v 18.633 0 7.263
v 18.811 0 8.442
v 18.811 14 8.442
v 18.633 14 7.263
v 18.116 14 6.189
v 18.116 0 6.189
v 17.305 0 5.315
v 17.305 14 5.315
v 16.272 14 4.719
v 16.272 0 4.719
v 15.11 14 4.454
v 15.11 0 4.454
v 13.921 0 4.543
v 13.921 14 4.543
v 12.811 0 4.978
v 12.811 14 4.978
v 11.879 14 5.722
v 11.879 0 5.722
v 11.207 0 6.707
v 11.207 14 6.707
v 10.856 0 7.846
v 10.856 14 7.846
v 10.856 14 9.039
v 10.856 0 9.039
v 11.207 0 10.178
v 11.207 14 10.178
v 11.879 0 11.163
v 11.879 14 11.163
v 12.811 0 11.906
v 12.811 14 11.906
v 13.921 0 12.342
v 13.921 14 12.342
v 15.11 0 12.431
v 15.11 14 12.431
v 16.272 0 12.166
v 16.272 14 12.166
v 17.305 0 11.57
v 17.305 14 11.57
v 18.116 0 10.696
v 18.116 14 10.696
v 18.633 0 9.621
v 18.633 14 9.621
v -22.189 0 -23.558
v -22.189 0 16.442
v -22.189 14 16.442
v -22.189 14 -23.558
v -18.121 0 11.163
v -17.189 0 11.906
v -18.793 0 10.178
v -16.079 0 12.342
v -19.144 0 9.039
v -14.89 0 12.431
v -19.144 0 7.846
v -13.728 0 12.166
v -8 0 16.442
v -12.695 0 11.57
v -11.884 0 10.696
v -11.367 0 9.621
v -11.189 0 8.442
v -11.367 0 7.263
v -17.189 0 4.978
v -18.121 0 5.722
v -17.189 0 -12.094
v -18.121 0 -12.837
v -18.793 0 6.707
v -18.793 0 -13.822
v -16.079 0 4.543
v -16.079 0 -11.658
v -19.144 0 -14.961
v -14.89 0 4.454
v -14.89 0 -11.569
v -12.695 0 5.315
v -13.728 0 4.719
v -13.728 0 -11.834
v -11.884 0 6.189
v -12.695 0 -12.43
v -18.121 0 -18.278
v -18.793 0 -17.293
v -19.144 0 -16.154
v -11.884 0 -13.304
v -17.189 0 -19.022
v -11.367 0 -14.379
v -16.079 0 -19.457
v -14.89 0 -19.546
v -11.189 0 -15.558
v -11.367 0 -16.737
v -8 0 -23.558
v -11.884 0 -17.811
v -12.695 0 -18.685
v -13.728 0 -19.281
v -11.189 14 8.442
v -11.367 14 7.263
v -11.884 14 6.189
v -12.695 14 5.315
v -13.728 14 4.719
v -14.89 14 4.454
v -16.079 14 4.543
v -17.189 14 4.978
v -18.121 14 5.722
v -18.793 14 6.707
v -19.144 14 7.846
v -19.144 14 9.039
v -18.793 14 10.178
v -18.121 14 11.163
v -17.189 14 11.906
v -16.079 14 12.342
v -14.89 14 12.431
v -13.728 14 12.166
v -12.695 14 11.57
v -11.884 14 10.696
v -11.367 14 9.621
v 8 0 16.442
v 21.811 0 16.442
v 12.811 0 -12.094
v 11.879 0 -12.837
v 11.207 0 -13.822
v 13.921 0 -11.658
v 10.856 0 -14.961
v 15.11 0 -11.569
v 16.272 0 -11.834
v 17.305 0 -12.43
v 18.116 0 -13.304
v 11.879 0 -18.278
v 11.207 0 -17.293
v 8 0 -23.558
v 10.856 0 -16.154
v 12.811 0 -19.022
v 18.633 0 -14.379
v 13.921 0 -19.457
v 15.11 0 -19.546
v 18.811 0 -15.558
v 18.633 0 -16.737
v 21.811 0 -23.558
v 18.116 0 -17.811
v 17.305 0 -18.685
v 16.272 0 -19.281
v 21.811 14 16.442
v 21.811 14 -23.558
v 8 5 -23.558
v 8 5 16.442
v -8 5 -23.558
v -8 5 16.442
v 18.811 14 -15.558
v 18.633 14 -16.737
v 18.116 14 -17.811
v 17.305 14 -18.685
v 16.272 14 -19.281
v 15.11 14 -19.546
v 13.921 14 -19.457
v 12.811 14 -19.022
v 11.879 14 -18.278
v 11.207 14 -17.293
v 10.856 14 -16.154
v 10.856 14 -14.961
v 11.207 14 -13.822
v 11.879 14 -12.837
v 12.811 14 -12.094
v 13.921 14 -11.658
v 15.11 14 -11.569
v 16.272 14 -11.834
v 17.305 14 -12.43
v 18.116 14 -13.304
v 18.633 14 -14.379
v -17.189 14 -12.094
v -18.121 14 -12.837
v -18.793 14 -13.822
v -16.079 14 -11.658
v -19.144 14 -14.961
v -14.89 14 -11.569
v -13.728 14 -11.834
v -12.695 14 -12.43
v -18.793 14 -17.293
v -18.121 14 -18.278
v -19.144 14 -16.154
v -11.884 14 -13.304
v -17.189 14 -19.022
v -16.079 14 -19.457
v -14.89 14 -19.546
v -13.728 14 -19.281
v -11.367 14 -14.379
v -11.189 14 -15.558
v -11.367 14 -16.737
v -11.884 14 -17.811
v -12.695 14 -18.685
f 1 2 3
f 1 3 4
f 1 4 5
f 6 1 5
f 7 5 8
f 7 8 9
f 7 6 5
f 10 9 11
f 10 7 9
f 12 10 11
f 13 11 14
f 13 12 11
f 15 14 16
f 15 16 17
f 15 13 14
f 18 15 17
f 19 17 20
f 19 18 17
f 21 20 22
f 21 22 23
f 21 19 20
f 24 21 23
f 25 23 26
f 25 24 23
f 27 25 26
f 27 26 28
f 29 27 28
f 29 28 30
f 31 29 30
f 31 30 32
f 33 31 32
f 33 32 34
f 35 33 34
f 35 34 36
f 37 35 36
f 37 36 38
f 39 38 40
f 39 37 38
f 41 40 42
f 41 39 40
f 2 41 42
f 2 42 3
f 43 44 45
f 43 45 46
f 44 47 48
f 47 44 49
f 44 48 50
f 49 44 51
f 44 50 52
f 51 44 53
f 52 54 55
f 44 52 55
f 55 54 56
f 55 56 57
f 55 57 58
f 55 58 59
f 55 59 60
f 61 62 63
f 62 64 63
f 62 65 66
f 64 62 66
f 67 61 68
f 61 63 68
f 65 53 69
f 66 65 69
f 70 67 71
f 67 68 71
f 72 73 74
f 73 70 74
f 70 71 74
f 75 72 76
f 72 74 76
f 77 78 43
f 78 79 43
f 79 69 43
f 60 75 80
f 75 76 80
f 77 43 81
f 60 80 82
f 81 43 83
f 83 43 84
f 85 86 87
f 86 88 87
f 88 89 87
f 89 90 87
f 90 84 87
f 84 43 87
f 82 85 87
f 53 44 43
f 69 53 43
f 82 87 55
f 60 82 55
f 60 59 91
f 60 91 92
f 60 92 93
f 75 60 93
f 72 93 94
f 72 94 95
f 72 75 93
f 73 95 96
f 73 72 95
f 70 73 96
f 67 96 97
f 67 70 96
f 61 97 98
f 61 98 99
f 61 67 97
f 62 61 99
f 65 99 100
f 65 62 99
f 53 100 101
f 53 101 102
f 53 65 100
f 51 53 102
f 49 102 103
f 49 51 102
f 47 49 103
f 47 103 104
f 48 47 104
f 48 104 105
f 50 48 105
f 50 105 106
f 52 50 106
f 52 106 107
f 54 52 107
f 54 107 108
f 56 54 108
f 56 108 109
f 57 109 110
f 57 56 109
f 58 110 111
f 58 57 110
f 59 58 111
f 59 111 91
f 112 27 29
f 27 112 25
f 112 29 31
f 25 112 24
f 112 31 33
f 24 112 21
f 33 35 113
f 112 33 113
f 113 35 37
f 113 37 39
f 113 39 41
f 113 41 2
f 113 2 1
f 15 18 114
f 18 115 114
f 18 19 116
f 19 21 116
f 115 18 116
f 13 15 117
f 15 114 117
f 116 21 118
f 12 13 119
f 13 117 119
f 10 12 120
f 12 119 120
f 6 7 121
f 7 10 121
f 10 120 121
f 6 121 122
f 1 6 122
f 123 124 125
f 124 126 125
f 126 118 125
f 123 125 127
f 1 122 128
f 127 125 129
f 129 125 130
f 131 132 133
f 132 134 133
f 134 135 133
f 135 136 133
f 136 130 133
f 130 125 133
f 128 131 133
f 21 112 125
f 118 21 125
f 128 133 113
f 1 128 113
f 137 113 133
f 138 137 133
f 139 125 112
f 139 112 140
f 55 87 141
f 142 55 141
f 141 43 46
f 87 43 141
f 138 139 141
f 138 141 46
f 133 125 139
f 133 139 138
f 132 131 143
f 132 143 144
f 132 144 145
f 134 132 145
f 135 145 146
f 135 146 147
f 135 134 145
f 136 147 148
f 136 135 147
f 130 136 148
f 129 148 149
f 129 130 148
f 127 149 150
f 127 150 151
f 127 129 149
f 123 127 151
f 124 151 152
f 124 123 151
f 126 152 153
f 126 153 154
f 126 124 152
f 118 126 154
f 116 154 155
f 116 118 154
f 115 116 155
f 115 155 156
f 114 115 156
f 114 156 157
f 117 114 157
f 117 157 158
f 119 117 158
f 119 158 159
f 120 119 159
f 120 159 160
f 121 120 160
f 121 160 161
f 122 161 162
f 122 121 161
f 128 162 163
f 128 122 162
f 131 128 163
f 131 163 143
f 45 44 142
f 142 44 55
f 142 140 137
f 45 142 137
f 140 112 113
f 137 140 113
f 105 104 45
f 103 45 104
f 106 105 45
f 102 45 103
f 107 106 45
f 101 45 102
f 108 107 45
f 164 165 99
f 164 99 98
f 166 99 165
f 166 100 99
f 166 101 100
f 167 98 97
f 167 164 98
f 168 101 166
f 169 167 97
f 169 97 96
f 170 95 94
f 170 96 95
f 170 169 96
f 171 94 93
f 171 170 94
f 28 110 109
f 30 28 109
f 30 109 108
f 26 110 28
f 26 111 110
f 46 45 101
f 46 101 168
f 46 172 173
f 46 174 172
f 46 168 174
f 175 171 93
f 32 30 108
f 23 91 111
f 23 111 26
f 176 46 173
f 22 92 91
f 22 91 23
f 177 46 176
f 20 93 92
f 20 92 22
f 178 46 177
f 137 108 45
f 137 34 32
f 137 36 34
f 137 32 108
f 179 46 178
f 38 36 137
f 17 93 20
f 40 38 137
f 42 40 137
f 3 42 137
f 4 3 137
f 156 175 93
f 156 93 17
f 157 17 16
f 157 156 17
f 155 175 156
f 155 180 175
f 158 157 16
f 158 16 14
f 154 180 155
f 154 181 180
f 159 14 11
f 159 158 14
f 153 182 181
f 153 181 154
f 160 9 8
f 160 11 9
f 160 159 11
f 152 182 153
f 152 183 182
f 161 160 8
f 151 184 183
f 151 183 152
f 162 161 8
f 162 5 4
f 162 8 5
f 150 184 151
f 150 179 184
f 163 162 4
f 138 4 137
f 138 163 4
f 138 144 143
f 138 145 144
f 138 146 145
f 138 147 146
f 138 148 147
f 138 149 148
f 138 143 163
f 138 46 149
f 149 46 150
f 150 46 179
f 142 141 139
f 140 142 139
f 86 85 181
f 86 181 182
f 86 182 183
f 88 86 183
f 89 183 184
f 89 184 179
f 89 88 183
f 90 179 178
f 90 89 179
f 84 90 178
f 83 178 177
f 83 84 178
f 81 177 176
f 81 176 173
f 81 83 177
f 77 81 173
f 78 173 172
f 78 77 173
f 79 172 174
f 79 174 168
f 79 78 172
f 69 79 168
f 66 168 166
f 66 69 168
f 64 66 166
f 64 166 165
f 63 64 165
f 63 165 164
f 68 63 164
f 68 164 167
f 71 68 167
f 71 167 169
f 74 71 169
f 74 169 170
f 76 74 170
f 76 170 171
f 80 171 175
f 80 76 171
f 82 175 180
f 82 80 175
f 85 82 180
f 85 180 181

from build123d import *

# Parameters (mm, degrees)
SKETCH1_W                      = 44
SKETCH1_H                      = 40
SKETCH1_R                      = 4
BOSS_EXTRUDE1_DEPTH            = 14
CUT_EXTRUDE1_REACH             = 18.442
SKETCH2_W                      = 16
SKETCH2_H                      = 7.114924263
CUT_EXTRUDE1_DIRECTION_2_REACH = 25.558


with BuildPart() as part:
    # Sketch1 → Boss-Extrude1 (new body)
    with BuildSketch(Plane(origin=(0, 0, 0), x_dir=(1, 0, 0), z_dir=(0, 1, 0))):
        with Locations((-0.188936111, 3.557633072)):
            Rectangle(SKETCH1_W, SKETCH1_H)
        with Locations((14.811063889, -8.442366928)):
            Circle(SKETCH1_R, mode=Mode.SUBTRACT)
        with Locations((14.811063889, 15.557633072)):
            Circle(SKETCH1_R, mode=Mode.SUBTRACT)
        with Locations((-15.188936111, 15.557633072)):
            Circle(SKETCH1_R, mode=Mode.SUBTRACT)
        with Locations((-15.188936111, -8.442366928)):
            Circle(SKETCH1_R, mode=Mode.SUBTRACT)
    extrude(amount=BOSS_EXTRUDE1_DEPTH)

    # Cut-Extrude1: up to this face of the body (flat: up to its plane)
    cut_extrude1_end = Plane(part.part.faces().sort_by_distance((-0.188936111, 7, 16.442366928))[0])
    # Sketch2 → Cut-Extrude1 (cut, up to the picked face)
    with BuildSketch(Plane.XY, mode=Mode.PRIVATE) as cut_extrude1_sk1:
        with Locations((0, 1.442537868)):
            Rectangle(SKETCH2_W, SKETCH2_H)
    cut_extrude1_tool1 = split(extrude(cut_extrude1_sk1.sketch, amount=CUT_EXTRUDE1_REACH, mode=Mode.PRIVATE), bisect_by=cut_extrude1_end, keep=Keep.BOTH, mode=Mode.PRIVATE)
    add(cut_extrude1_tool1.solids().sort_by_distance((0, 1.442538, 0))[0], mode=Mode.SUBTRACT)

    # Cut-Extrude1 direction 2: up to this face of the body (flat: up to its plane)
    cut_extrude1_direction_2_end = Plane(part.part.faces().sort_by_distance((-0.188936111, 7, -23.557633072))[0])
    # Sketch2 → Cut-Extrude1 direction 2 (cut, up to the picked face)
    with BuildSketch(Plane.XY, mode=Mode.PRIVATE) as cut_extrude1_direction_2_sk1:
        with Locations((0, 1.442537868)):
            Rectangle(SKETCH2_W, SKETCH2_H)
    cut_extrude1_direction_2_tool1 = split(extrude(cut_extrude1_direction_2_sk1.sketch, amount=-CUT_EXTRUDE1_DIRECTION_2_REACH, mode=Mode.PRIVATE), bisect_by=cut_extrude1_direction_2_end, keep=Keep.BOTH, mode=Mode.PRIVATE)
    add(cut_extrude1_direction_2_tool1.solids().sort_by_distance((0, 1.442538, 0))[0], mode=Mode.SUBTRACT)


solid = part.part
